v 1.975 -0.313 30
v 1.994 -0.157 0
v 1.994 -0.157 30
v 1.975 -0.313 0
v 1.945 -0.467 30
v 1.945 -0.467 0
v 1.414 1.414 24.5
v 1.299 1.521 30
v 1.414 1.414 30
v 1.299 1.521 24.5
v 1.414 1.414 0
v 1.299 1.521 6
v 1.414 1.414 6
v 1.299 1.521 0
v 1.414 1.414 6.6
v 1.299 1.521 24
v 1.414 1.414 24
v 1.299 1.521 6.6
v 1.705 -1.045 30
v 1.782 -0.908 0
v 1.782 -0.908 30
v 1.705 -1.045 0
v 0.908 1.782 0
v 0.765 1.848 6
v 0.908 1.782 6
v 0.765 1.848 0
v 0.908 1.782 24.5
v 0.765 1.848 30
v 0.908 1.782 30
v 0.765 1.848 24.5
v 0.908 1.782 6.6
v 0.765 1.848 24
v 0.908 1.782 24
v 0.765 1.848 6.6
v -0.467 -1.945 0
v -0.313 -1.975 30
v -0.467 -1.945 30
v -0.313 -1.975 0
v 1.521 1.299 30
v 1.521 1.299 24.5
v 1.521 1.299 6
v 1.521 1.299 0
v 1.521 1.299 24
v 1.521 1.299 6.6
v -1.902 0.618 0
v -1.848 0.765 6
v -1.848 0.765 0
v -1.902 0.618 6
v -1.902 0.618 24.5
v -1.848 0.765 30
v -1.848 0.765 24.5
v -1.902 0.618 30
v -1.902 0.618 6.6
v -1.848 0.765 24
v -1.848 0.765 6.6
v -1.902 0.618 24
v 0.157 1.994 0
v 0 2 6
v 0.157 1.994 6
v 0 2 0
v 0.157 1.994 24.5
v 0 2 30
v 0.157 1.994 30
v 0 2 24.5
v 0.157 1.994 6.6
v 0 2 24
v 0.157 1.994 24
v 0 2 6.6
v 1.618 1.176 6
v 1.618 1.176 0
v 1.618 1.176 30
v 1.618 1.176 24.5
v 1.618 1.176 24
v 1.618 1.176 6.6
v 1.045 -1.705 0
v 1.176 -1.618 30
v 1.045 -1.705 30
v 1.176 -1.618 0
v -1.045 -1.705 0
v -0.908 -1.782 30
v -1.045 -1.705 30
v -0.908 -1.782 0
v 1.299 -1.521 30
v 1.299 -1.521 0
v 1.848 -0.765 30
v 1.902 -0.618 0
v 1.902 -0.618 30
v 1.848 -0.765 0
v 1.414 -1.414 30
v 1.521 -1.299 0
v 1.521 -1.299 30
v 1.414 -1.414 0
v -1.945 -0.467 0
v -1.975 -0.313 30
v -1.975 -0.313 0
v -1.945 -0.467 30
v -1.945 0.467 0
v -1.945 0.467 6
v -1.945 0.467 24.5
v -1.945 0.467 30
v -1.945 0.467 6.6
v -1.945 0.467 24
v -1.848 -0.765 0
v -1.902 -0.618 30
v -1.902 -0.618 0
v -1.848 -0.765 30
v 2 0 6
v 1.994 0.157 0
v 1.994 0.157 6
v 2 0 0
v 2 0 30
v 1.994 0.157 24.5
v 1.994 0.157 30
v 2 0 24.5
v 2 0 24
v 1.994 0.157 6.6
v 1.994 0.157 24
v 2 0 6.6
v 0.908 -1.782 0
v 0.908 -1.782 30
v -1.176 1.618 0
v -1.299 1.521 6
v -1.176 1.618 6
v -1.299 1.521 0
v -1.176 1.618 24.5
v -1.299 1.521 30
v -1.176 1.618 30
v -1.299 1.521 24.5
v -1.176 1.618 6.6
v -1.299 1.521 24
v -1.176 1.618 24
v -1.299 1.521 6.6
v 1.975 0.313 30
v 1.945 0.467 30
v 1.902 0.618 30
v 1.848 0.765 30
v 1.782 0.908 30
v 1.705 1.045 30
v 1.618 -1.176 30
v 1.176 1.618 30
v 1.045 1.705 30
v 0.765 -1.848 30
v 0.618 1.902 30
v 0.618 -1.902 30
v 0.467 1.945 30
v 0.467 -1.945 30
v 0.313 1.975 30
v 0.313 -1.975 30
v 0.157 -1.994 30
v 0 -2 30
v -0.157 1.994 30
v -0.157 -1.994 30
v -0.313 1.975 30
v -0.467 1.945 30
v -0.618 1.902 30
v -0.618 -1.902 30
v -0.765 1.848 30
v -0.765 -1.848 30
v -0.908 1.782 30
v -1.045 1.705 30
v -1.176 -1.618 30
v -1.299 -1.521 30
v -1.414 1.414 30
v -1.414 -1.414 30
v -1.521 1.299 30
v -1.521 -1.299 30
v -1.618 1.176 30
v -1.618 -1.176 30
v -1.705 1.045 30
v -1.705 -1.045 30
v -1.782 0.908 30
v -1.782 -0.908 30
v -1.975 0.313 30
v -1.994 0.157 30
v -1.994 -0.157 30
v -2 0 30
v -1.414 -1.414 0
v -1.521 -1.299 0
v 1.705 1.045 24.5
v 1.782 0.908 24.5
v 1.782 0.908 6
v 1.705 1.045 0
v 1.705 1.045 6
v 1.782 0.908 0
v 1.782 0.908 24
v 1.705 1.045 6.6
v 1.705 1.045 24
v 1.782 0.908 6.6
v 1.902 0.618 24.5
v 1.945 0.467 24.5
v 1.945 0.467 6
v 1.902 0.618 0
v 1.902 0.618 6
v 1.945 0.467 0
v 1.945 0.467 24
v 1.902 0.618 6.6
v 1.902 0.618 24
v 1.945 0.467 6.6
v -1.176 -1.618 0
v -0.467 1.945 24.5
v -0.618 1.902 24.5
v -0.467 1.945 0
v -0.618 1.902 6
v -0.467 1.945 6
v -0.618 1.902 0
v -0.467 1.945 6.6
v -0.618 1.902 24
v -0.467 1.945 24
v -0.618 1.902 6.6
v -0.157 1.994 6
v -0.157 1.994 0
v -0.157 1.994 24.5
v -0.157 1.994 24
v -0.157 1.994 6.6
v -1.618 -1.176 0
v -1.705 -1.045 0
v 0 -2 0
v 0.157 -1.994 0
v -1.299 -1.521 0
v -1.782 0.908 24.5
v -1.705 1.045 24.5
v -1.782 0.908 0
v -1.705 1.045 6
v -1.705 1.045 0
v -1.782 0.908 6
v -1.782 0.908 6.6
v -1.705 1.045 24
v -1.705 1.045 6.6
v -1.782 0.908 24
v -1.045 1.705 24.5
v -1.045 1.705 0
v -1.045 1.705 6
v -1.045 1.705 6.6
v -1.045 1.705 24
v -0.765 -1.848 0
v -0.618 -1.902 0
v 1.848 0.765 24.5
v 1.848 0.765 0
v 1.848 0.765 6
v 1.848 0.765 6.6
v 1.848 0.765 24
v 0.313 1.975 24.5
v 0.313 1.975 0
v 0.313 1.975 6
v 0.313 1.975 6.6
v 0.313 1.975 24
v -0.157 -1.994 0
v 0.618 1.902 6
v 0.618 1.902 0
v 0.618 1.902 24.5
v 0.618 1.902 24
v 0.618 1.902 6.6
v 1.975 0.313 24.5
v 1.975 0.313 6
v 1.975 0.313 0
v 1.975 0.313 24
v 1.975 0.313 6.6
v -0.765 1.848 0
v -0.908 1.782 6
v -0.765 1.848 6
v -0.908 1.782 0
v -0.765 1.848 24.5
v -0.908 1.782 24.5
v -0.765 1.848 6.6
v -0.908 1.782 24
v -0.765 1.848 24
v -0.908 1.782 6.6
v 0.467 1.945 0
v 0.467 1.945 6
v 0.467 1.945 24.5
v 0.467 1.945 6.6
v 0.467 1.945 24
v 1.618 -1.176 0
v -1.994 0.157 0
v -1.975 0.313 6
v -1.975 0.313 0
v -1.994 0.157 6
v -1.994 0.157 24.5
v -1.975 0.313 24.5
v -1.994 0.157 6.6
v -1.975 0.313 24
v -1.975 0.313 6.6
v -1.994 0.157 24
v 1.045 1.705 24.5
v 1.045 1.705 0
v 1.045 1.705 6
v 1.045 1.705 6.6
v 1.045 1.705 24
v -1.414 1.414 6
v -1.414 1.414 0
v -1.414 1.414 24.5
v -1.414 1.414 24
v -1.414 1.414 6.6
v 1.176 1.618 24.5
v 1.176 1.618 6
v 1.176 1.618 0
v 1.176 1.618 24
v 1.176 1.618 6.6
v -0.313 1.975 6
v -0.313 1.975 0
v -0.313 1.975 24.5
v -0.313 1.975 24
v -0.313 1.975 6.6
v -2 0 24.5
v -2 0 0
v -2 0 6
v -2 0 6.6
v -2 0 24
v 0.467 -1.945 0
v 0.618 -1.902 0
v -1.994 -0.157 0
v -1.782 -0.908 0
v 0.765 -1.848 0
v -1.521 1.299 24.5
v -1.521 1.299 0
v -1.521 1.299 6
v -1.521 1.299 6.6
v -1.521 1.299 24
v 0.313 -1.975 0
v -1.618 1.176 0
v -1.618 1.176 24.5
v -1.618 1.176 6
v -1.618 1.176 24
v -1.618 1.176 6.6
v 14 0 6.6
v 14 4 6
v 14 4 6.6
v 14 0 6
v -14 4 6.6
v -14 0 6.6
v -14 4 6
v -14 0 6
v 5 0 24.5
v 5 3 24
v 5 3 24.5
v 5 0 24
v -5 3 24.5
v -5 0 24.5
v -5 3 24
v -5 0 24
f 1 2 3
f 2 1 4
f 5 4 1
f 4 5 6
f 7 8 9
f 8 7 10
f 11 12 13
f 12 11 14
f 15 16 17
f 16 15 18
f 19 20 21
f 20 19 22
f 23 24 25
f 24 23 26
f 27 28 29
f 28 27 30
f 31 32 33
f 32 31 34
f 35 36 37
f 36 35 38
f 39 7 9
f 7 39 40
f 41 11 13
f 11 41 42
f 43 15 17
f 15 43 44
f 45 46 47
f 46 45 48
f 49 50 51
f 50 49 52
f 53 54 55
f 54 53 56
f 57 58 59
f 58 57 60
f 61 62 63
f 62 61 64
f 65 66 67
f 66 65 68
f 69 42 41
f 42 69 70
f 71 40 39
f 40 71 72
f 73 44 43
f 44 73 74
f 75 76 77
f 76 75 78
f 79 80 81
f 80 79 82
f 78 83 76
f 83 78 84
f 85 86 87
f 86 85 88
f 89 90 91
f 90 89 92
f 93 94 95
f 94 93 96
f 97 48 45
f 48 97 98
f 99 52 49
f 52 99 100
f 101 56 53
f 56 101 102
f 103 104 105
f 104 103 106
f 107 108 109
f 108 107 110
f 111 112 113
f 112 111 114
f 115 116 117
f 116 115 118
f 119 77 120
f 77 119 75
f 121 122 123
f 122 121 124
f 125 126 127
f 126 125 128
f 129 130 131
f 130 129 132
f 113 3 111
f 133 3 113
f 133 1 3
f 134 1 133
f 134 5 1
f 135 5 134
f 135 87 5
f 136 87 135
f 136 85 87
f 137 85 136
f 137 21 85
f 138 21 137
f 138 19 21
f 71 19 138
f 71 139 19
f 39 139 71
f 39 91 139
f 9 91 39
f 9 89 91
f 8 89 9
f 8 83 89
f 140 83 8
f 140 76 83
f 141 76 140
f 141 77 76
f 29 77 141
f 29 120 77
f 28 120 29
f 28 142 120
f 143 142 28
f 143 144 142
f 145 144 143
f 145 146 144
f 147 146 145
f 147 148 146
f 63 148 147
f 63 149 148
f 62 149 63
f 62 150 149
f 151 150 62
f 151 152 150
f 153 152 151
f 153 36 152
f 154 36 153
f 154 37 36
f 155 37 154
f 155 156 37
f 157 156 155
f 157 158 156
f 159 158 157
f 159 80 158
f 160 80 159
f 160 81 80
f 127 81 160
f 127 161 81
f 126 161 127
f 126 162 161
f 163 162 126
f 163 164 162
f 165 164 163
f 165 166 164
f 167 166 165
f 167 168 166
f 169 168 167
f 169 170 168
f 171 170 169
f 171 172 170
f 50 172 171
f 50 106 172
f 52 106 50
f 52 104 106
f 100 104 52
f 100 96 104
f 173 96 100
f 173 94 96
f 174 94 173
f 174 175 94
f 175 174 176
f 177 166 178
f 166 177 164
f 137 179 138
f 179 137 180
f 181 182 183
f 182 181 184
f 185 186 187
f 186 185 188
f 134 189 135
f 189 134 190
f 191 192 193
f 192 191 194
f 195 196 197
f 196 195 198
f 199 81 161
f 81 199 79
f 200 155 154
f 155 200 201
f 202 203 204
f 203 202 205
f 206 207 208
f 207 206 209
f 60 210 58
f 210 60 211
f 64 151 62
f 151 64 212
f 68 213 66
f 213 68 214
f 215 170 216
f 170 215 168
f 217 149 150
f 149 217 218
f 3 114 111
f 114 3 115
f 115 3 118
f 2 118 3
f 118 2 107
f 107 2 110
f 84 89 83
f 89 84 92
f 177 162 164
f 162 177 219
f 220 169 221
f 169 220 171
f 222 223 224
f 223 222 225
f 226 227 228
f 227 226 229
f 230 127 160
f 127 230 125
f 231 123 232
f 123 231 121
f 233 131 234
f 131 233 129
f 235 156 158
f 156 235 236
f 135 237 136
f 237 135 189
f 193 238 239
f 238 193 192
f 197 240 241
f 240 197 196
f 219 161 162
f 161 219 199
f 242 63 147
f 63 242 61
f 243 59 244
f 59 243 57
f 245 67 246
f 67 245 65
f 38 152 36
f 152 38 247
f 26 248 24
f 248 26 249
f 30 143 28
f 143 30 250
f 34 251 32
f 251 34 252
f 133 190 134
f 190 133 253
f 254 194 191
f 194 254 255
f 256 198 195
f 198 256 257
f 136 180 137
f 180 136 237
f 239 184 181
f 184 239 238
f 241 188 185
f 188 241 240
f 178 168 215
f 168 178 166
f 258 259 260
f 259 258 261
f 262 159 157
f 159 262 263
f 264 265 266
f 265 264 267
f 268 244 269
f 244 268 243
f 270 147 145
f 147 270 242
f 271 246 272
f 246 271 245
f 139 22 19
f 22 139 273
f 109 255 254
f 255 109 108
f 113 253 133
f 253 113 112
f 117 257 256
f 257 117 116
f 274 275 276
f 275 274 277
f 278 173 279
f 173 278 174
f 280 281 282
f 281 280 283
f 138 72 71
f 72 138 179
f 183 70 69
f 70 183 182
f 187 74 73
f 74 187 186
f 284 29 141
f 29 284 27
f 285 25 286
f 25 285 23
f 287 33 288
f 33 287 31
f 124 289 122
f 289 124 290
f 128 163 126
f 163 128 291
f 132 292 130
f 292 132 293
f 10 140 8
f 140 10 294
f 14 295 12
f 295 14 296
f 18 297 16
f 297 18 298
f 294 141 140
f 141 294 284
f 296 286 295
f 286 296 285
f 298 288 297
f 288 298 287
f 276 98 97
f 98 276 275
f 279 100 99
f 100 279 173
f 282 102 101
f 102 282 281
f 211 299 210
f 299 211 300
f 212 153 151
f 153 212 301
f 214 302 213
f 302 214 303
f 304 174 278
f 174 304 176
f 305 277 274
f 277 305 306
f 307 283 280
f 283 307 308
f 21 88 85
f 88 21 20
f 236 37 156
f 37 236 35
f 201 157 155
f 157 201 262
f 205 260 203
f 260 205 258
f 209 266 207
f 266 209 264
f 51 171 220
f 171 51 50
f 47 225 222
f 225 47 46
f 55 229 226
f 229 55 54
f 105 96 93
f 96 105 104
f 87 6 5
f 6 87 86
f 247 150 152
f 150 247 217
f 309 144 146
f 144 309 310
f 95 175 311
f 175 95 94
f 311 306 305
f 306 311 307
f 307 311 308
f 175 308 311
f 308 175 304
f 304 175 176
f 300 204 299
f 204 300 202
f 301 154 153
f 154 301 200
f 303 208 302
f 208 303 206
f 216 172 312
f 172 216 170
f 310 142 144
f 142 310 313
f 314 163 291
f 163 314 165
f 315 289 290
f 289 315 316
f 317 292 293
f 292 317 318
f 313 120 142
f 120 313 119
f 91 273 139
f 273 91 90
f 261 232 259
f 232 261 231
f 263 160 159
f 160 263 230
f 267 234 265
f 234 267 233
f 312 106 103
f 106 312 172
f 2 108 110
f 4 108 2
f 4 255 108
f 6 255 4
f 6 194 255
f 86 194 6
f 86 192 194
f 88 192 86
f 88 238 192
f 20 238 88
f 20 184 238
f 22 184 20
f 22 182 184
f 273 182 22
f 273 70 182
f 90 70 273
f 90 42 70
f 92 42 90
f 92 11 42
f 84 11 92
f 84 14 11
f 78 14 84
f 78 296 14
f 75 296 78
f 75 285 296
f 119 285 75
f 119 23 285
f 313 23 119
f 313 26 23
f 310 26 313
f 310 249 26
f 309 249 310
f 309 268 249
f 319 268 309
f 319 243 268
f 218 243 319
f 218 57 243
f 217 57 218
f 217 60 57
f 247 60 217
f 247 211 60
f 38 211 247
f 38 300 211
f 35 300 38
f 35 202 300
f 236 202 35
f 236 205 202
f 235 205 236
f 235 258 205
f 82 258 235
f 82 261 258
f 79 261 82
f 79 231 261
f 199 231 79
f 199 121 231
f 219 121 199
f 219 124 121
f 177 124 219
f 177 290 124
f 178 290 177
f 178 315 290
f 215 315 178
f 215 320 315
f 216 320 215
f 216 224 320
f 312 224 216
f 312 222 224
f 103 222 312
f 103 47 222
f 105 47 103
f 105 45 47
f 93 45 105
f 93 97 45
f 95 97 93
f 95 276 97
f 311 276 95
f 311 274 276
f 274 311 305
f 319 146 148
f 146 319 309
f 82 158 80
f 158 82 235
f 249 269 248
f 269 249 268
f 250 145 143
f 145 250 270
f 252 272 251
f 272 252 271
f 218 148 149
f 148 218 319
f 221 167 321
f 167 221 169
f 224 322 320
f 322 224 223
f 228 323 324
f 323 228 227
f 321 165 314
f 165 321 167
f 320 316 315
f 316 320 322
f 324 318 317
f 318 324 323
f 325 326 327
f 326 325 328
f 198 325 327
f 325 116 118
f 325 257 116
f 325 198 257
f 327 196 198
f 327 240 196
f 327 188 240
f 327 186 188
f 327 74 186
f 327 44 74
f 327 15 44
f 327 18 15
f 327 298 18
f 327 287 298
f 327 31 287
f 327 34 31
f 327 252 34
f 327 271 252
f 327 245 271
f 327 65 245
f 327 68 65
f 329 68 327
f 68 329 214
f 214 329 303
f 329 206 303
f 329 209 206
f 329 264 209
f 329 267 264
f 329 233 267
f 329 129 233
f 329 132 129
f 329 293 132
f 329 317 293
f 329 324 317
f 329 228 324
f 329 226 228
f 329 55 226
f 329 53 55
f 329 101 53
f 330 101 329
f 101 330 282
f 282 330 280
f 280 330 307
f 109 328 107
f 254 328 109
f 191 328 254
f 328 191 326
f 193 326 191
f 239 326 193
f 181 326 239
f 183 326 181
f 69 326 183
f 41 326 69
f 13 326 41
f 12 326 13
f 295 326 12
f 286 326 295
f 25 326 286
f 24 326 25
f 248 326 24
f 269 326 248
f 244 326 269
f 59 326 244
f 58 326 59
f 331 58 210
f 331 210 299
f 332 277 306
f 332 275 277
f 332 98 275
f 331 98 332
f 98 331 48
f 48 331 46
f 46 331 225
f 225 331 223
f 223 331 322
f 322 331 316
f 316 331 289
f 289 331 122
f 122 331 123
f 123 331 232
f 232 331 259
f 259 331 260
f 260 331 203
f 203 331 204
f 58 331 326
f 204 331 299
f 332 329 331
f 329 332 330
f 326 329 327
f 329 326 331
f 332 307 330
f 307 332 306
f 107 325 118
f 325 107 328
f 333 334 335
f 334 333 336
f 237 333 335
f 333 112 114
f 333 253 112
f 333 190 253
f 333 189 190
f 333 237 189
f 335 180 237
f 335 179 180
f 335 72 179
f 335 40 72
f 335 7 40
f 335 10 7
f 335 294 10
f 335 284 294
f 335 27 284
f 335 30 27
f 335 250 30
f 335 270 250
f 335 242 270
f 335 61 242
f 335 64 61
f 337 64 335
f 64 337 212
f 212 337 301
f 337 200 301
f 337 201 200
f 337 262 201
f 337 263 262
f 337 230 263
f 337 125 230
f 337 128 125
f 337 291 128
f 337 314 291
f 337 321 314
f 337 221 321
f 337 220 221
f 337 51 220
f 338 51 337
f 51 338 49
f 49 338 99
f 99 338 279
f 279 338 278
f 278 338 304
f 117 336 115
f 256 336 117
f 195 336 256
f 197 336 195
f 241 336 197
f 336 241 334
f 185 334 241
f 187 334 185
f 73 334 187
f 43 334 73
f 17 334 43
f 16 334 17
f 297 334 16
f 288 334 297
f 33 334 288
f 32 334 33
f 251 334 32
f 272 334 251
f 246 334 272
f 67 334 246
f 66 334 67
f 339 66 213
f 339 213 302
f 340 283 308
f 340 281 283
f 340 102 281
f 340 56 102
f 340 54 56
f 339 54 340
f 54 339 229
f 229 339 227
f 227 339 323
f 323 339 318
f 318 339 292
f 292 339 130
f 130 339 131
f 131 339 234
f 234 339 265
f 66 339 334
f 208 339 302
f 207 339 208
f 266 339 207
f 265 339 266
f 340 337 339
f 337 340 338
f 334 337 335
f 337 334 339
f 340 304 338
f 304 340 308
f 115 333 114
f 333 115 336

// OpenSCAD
// AGENT-GENERATED CAD MODEL
// Decision-driven, headless

$fn = 80;

// Fuselage
cylinder(h=30, r=2);

// Wing
translate([-14.0, 0, 6.0])
cube([28, 4, 0.6]);

// Tail
translate([-5.0, 0, 24.0])
cube([10, 3, 0.5]);
